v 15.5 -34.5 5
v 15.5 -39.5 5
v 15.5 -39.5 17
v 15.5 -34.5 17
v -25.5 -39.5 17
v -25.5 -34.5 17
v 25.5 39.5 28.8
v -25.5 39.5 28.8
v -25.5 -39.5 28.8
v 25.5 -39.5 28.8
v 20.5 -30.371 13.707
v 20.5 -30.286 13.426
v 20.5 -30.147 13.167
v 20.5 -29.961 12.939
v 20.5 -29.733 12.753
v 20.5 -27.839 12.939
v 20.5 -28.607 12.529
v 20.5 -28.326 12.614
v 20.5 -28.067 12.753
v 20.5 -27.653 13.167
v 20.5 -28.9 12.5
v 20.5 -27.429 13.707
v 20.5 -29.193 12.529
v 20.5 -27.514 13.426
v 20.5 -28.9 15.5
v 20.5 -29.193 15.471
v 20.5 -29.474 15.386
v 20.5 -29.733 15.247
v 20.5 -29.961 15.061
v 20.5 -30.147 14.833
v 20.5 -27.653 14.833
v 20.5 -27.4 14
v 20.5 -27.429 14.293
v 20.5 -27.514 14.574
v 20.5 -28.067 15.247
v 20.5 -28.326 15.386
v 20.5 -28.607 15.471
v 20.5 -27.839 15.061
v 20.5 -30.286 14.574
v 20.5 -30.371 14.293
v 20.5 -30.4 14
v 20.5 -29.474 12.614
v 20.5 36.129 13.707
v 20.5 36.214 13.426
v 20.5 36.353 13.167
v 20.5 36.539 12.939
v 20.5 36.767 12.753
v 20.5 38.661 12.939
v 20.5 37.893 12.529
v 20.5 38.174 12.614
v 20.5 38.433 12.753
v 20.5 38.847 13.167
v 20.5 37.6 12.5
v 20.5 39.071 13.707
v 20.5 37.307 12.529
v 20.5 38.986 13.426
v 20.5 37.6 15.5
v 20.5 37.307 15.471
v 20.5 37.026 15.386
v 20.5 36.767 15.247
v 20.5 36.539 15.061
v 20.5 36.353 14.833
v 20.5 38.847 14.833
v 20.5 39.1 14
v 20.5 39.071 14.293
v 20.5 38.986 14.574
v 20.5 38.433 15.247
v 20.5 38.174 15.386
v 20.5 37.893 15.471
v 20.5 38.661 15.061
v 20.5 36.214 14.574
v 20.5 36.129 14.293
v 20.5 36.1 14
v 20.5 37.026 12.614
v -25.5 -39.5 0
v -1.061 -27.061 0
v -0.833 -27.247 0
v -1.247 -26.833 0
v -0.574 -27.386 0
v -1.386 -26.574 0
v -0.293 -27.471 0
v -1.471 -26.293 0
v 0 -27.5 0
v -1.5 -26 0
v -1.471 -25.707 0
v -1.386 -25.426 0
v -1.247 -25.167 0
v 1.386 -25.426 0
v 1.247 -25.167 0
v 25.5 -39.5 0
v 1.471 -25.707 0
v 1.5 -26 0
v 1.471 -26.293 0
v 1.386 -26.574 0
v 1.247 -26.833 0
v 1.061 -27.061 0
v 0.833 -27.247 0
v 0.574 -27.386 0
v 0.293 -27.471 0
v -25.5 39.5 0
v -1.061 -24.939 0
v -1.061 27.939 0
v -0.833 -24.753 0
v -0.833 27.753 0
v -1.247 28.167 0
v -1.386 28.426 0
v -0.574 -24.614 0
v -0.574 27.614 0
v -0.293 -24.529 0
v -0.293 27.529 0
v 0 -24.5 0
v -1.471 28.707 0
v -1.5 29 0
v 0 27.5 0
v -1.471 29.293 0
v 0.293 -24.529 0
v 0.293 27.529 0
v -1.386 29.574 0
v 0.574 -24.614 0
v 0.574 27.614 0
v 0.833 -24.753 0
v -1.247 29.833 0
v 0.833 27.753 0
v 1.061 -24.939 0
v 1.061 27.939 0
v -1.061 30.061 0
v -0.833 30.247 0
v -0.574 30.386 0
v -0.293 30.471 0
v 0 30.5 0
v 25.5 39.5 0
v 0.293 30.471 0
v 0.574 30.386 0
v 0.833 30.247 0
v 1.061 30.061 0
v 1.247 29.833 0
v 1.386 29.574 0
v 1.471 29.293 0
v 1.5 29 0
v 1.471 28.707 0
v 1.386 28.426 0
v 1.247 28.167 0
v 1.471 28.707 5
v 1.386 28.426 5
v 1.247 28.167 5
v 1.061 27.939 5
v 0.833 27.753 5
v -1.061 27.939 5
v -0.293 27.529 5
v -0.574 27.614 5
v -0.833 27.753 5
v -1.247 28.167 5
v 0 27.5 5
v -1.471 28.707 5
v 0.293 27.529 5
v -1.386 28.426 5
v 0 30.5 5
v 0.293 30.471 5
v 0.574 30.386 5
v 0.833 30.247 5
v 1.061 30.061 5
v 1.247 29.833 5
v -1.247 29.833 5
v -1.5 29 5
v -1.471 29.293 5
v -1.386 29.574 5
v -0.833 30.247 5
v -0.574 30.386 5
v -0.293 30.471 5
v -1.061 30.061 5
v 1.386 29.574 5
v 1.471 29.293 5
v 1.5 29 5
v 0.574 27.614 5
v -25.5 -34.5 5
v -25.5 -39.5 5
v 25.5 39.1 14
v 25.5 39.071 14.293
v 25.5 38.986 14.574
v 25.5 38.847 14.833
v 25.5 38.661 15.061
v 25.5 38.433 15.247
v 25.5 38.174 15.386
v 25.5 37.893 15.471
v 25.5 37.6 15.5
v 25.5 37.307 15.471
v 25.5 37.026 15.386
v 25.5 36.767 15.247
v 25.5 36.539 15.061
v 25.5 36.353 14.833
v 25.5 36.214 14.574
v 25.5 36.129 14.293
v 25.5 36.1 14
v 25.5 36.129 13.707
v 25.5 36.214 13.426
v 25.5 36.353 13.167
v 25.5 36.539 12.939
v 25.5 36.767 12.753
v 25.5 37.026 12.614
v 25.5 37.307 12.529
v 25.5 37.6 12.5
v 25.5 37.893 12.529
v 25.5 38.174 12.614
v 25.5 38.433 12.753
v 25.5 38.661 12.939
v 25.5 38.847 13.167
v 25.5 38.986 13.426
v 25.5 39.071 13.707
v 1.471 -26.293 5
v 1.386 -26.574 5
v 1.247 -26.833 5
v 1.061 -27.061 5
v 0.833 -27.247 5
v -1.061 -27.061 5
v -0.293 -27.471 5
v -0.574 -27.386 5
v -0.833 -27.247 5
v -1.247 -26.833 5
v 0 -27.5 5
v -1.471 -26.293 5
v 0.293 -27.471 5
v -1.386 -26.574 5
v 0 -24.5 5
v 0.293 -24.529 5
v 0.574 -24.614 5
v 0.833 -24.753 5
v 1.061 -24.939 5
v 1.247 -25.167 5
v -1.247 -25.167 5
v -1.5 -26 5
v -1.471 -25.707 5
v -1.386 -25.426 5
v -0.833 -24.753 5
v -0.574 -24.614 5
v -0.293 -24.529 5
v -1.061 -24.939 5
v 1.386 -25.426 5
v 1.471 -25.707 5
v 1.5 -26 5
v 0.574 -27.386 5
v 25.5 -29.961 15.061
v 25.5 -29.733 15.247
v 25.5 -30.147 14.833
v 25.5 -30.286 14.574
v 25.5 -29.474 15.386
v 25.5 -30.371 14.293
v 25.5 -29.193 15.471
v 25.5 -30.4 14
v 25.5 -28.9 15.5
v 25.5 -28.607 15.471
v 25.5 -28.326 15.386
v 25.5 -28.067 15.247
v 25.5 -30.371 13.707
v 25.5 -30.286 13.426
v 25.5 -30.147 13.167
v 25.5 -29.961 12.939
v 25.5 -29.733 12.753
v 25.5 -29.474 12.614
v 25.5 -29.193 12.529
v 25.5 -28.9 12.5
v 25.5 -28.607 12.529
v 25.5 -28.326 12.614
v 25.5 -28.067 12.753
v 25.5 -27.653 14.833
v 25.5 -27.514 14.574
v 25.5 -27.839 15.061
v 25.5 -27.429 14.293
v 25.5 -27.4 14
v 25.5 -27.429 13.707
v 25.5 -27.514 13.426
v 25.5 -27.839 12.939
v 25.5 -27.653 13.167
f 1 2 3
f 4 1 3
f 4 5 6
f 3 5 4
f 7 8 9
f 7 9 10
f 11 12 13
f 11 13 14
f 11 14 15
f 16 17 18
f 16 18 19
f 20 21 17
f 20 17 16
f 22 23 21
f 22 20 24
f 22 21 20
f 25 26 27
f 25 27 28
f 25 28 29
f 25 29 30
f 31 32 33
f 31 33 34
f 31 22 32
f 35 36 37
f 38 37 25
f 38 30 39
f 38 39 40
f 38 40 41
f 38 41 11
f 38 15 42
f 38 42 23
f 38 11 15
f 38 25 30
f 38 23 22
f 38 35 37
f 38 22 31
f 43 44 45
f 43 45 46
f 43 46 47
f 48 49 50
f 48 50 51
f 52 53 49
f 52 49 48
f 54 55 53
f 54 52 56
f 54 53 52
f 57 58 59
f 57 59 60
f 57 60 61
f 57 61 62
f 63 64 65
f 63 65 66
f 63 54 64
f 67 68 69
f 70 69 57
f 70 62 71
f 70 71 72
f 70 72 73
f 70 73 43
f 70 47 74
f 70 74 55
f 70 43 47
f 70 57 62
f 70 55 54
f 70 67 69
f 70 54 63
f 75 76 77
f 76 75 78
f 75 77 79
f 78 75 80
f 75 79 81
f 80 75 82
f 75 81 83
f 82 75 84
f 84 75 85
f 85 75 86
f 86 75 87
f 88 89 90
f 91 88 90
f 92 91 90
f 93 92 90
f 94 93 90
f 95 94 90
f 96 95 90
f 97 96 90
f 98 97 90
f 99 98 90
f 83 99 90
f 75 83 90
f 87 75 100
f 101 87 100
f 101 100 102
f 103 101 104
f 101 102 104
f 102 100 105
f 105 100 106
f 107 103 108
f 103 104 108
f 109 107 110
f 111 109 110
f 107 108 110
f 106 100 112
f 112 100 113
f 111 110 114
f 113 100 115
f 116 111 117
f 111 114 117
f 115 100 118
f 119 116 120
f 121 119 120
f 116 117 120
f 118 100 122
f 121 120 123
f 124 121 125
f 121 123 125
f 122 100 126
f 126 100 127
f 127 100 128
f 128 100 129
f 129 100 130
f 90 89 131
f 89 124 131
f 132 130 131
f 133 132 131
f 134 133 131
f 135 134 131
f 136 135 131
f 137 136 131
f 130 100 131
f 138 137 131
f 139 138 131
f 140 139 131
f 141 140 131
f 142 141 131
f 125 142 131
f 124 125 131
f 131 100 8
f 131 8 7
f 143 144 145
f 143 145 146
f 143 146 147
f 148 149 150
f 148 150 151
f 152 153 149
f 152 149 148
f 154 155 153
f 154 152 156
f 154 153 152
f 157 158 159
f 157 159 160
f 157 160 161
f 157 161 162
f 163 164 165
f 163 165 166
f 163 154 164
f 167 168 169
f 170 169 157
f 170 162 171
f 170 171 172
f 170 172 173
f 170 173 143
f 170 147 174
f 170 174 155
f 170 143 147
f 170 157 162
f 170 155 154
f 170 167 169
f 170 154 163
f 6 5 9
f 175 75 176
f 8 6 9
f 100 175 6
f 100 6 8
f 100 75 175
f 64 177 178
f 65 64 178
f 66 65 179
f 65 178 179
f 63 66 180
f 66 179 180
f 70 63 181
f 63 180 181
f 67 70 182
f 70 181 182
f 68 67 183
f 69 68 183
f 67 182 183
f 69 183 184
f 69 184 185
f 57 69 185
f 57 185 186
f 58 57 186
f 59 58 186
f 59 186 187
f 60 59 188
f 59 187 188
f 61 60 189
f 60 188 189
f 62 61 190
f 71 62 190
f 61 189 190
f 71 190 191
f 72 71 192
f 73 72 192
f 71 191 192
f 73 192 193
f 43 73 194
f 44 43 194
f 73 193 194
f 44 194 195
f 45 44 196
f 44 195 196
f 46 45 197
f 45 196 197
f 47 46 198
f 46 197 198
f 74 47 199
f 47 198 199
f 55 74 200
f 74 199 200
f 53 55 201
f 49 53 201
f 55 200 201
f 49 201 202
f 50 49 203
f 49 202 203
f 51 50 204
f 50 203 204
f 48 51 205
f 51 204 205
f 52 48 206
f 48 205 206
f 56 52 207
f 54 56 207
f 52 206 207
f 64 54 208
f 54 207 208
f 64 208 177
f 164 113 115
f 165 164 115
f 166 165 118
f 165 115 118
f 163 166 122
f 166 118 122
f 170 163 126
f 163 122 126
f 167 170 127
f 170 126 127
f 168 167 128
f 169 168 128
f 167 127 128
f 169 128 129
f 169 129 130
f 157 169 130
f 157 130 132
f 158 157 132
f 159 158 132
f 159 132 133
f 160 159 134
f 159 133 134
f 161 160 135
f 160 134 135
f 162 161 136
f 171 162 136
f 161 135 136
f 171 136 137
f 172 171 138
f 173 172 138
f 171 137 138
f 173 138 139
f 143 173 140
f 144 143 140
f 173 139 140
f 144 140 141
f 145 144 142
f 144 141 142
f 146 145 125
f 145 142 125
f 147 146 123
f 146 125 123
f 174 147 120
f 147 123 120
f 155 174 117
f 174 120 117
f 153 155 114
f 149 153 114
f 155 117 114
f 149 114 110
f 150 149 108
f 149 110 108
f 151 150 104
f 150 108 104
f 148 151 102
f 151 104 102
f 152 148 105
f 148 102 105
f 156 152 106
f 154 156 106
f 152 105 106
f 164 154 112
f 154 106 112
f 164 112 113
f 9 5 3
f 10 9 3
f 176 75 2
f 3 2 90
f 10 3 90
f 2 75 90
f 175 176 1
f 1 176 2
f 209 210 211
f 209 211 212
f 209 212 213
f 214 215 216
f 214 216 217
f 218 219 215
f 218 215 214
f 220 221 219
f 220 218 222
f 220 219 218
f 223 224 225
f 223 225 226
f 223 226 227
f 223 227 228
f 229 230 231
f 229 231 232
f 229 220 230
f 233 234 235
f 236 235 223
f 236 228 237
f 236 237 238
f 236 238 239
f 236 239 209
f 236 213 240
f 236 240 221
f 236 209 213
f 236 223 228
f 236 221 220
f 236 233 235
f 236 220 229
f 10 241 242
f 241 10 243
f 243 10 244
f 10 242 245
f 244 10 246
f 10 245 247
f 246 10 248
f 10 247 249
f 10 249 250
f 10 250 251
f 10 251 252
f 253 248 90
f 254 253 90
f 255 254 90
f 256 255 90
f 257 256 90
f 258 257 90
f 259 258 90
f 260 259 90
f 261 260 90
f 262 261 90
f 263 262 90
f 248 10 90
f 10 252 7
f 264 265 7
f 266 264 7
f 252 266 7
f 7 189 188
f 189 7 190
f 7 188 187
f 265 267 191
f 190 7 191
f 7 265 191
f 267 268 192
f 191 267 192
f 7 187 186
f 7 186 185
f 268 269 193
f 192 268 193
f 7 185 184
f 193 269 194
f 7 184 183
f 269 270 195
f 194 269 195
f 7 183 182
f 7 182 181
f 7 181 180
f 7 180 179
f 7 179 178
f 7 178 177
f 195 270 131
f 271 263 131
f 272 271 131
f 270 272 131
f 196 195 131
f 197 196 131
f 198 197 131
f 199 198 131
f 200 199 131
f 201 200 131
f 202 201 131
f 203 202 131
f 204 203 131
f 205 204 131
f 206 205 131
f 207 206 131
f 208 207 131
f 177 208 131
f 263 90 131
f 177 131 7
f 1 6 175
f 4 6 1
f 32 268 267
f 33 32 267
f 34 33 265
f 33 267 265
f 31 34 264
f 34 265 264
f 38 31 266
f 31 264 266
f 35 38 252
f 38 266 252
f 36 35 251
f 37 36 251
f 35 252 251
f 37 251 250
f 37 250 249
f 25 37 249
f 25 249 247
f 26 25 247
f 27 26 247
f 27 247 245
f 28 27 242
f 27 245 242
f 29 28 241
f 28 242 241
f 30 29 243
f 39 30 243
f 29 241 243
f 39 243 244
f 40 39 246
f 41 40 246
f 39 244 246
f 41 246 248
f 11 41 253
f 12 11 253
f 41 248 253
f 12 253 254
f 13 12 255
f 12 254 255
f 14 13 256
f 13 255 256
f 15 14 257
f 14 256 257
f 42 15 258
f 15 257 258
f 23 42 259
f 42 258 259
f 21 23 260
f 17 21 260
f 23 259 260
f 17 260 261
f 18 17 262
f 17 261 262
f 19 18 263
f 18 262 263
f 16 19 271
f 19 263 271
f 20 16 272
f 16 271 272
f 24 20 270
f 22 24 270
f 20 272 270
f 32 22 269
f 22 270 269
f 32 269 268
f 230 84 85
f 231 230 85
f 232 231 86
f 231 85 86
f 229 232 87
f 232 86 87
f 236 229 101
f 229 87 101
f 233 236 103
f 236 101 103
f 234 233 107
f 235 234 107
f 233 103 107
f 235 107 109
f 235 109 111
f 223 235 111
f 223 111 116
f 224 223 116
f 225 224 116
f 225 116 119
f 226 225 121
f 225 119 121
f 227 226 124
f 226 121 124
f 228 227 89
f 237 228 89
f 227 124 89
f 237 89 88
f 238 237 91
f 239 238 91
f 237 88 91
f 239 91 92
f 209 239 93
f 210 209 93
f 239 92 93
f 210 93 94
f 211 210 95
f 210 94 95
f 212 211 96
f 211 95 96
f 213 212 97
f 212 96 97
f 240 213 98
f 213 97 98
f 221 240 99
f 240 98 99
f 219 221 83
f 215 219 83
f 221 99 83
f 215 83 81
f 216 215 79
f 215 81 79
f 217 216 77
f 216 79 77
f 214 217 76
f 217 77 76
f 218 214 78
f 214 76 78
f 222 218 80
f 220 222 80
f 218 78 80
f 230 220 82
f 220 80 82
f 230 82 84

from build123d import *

# Parameters (mm, degrees)
SKETCH_1_W          = 51
SKETCH_1_H          = 79
EXTRUDE_1_DEPTH     = 28.8
SKETCH_2_R          = 1.5
CUT_EXTRUDE_1_DEPTH = 5
SKETCH_3_R          = 1.5
CUT_EXTRUDE_2_DEPTH = 5
SKETCH_4_W          = 41
SKETCH_4_H          = 12
CUT_EXTRUDE_3_DEPTH = 5


with BuildPart() as part:
    # 草图1 → 凸台-拉伸1 (new body)
    with BuildSketch(Plane.XY):
        Rectangle(SKETCH_1_W, SKETCH_1_H)
    extrude(amount=EXTRUDE_1_DEPTH)

    # 草图2 → 切除-拉伸1 (cut)
    with BuildSketch(Plane(origin=(0, 0, 0), x_dir=(-1, 0, 0), z_dir=(0, 0, -1))):
        with Locations((0, 29)):
            Circle(SKETCH_2_R)
        with Locations((0, -26)):
            Circle(SKETCH_2_R)
    extrude(amount=-CUT_EXTRUDE_1_DEPTH, mode=Mode.SUBTRACT)

    # 草图3 → 切除-拉伸2 (cut)
    with BuildSketch(Plane(origin=(25.5, 0, 0), x_dir=(0, 0, -1), z_dir=(1, 0, 0))):
        with Locations(Location((-14, 37.6, 0), (0, 0, 90))):
            Circle(SKETCH_3_R)
        with Locations(Location((-14, -28.9, 0), (0, 0, 90))):
            Circle(SKETCH_3_R)
    extrude(amount=-CUT_EXTRUDE_2_DEPTH, mode=Mode.SUBTRACT)

    # 草图4 → 切除-拉伸3 (cut)
    with BuildSketch(Plane.XZ.offset(39.5)):
        with Locations((-5, 11)):
            Rectangle(SKETCH_4_W, SKETCH_4_H)
    extrude(amount=-CUT_EXTRUDE_3_DEPTH, mode=Mode.SUBTRACT)


solid = part.part
